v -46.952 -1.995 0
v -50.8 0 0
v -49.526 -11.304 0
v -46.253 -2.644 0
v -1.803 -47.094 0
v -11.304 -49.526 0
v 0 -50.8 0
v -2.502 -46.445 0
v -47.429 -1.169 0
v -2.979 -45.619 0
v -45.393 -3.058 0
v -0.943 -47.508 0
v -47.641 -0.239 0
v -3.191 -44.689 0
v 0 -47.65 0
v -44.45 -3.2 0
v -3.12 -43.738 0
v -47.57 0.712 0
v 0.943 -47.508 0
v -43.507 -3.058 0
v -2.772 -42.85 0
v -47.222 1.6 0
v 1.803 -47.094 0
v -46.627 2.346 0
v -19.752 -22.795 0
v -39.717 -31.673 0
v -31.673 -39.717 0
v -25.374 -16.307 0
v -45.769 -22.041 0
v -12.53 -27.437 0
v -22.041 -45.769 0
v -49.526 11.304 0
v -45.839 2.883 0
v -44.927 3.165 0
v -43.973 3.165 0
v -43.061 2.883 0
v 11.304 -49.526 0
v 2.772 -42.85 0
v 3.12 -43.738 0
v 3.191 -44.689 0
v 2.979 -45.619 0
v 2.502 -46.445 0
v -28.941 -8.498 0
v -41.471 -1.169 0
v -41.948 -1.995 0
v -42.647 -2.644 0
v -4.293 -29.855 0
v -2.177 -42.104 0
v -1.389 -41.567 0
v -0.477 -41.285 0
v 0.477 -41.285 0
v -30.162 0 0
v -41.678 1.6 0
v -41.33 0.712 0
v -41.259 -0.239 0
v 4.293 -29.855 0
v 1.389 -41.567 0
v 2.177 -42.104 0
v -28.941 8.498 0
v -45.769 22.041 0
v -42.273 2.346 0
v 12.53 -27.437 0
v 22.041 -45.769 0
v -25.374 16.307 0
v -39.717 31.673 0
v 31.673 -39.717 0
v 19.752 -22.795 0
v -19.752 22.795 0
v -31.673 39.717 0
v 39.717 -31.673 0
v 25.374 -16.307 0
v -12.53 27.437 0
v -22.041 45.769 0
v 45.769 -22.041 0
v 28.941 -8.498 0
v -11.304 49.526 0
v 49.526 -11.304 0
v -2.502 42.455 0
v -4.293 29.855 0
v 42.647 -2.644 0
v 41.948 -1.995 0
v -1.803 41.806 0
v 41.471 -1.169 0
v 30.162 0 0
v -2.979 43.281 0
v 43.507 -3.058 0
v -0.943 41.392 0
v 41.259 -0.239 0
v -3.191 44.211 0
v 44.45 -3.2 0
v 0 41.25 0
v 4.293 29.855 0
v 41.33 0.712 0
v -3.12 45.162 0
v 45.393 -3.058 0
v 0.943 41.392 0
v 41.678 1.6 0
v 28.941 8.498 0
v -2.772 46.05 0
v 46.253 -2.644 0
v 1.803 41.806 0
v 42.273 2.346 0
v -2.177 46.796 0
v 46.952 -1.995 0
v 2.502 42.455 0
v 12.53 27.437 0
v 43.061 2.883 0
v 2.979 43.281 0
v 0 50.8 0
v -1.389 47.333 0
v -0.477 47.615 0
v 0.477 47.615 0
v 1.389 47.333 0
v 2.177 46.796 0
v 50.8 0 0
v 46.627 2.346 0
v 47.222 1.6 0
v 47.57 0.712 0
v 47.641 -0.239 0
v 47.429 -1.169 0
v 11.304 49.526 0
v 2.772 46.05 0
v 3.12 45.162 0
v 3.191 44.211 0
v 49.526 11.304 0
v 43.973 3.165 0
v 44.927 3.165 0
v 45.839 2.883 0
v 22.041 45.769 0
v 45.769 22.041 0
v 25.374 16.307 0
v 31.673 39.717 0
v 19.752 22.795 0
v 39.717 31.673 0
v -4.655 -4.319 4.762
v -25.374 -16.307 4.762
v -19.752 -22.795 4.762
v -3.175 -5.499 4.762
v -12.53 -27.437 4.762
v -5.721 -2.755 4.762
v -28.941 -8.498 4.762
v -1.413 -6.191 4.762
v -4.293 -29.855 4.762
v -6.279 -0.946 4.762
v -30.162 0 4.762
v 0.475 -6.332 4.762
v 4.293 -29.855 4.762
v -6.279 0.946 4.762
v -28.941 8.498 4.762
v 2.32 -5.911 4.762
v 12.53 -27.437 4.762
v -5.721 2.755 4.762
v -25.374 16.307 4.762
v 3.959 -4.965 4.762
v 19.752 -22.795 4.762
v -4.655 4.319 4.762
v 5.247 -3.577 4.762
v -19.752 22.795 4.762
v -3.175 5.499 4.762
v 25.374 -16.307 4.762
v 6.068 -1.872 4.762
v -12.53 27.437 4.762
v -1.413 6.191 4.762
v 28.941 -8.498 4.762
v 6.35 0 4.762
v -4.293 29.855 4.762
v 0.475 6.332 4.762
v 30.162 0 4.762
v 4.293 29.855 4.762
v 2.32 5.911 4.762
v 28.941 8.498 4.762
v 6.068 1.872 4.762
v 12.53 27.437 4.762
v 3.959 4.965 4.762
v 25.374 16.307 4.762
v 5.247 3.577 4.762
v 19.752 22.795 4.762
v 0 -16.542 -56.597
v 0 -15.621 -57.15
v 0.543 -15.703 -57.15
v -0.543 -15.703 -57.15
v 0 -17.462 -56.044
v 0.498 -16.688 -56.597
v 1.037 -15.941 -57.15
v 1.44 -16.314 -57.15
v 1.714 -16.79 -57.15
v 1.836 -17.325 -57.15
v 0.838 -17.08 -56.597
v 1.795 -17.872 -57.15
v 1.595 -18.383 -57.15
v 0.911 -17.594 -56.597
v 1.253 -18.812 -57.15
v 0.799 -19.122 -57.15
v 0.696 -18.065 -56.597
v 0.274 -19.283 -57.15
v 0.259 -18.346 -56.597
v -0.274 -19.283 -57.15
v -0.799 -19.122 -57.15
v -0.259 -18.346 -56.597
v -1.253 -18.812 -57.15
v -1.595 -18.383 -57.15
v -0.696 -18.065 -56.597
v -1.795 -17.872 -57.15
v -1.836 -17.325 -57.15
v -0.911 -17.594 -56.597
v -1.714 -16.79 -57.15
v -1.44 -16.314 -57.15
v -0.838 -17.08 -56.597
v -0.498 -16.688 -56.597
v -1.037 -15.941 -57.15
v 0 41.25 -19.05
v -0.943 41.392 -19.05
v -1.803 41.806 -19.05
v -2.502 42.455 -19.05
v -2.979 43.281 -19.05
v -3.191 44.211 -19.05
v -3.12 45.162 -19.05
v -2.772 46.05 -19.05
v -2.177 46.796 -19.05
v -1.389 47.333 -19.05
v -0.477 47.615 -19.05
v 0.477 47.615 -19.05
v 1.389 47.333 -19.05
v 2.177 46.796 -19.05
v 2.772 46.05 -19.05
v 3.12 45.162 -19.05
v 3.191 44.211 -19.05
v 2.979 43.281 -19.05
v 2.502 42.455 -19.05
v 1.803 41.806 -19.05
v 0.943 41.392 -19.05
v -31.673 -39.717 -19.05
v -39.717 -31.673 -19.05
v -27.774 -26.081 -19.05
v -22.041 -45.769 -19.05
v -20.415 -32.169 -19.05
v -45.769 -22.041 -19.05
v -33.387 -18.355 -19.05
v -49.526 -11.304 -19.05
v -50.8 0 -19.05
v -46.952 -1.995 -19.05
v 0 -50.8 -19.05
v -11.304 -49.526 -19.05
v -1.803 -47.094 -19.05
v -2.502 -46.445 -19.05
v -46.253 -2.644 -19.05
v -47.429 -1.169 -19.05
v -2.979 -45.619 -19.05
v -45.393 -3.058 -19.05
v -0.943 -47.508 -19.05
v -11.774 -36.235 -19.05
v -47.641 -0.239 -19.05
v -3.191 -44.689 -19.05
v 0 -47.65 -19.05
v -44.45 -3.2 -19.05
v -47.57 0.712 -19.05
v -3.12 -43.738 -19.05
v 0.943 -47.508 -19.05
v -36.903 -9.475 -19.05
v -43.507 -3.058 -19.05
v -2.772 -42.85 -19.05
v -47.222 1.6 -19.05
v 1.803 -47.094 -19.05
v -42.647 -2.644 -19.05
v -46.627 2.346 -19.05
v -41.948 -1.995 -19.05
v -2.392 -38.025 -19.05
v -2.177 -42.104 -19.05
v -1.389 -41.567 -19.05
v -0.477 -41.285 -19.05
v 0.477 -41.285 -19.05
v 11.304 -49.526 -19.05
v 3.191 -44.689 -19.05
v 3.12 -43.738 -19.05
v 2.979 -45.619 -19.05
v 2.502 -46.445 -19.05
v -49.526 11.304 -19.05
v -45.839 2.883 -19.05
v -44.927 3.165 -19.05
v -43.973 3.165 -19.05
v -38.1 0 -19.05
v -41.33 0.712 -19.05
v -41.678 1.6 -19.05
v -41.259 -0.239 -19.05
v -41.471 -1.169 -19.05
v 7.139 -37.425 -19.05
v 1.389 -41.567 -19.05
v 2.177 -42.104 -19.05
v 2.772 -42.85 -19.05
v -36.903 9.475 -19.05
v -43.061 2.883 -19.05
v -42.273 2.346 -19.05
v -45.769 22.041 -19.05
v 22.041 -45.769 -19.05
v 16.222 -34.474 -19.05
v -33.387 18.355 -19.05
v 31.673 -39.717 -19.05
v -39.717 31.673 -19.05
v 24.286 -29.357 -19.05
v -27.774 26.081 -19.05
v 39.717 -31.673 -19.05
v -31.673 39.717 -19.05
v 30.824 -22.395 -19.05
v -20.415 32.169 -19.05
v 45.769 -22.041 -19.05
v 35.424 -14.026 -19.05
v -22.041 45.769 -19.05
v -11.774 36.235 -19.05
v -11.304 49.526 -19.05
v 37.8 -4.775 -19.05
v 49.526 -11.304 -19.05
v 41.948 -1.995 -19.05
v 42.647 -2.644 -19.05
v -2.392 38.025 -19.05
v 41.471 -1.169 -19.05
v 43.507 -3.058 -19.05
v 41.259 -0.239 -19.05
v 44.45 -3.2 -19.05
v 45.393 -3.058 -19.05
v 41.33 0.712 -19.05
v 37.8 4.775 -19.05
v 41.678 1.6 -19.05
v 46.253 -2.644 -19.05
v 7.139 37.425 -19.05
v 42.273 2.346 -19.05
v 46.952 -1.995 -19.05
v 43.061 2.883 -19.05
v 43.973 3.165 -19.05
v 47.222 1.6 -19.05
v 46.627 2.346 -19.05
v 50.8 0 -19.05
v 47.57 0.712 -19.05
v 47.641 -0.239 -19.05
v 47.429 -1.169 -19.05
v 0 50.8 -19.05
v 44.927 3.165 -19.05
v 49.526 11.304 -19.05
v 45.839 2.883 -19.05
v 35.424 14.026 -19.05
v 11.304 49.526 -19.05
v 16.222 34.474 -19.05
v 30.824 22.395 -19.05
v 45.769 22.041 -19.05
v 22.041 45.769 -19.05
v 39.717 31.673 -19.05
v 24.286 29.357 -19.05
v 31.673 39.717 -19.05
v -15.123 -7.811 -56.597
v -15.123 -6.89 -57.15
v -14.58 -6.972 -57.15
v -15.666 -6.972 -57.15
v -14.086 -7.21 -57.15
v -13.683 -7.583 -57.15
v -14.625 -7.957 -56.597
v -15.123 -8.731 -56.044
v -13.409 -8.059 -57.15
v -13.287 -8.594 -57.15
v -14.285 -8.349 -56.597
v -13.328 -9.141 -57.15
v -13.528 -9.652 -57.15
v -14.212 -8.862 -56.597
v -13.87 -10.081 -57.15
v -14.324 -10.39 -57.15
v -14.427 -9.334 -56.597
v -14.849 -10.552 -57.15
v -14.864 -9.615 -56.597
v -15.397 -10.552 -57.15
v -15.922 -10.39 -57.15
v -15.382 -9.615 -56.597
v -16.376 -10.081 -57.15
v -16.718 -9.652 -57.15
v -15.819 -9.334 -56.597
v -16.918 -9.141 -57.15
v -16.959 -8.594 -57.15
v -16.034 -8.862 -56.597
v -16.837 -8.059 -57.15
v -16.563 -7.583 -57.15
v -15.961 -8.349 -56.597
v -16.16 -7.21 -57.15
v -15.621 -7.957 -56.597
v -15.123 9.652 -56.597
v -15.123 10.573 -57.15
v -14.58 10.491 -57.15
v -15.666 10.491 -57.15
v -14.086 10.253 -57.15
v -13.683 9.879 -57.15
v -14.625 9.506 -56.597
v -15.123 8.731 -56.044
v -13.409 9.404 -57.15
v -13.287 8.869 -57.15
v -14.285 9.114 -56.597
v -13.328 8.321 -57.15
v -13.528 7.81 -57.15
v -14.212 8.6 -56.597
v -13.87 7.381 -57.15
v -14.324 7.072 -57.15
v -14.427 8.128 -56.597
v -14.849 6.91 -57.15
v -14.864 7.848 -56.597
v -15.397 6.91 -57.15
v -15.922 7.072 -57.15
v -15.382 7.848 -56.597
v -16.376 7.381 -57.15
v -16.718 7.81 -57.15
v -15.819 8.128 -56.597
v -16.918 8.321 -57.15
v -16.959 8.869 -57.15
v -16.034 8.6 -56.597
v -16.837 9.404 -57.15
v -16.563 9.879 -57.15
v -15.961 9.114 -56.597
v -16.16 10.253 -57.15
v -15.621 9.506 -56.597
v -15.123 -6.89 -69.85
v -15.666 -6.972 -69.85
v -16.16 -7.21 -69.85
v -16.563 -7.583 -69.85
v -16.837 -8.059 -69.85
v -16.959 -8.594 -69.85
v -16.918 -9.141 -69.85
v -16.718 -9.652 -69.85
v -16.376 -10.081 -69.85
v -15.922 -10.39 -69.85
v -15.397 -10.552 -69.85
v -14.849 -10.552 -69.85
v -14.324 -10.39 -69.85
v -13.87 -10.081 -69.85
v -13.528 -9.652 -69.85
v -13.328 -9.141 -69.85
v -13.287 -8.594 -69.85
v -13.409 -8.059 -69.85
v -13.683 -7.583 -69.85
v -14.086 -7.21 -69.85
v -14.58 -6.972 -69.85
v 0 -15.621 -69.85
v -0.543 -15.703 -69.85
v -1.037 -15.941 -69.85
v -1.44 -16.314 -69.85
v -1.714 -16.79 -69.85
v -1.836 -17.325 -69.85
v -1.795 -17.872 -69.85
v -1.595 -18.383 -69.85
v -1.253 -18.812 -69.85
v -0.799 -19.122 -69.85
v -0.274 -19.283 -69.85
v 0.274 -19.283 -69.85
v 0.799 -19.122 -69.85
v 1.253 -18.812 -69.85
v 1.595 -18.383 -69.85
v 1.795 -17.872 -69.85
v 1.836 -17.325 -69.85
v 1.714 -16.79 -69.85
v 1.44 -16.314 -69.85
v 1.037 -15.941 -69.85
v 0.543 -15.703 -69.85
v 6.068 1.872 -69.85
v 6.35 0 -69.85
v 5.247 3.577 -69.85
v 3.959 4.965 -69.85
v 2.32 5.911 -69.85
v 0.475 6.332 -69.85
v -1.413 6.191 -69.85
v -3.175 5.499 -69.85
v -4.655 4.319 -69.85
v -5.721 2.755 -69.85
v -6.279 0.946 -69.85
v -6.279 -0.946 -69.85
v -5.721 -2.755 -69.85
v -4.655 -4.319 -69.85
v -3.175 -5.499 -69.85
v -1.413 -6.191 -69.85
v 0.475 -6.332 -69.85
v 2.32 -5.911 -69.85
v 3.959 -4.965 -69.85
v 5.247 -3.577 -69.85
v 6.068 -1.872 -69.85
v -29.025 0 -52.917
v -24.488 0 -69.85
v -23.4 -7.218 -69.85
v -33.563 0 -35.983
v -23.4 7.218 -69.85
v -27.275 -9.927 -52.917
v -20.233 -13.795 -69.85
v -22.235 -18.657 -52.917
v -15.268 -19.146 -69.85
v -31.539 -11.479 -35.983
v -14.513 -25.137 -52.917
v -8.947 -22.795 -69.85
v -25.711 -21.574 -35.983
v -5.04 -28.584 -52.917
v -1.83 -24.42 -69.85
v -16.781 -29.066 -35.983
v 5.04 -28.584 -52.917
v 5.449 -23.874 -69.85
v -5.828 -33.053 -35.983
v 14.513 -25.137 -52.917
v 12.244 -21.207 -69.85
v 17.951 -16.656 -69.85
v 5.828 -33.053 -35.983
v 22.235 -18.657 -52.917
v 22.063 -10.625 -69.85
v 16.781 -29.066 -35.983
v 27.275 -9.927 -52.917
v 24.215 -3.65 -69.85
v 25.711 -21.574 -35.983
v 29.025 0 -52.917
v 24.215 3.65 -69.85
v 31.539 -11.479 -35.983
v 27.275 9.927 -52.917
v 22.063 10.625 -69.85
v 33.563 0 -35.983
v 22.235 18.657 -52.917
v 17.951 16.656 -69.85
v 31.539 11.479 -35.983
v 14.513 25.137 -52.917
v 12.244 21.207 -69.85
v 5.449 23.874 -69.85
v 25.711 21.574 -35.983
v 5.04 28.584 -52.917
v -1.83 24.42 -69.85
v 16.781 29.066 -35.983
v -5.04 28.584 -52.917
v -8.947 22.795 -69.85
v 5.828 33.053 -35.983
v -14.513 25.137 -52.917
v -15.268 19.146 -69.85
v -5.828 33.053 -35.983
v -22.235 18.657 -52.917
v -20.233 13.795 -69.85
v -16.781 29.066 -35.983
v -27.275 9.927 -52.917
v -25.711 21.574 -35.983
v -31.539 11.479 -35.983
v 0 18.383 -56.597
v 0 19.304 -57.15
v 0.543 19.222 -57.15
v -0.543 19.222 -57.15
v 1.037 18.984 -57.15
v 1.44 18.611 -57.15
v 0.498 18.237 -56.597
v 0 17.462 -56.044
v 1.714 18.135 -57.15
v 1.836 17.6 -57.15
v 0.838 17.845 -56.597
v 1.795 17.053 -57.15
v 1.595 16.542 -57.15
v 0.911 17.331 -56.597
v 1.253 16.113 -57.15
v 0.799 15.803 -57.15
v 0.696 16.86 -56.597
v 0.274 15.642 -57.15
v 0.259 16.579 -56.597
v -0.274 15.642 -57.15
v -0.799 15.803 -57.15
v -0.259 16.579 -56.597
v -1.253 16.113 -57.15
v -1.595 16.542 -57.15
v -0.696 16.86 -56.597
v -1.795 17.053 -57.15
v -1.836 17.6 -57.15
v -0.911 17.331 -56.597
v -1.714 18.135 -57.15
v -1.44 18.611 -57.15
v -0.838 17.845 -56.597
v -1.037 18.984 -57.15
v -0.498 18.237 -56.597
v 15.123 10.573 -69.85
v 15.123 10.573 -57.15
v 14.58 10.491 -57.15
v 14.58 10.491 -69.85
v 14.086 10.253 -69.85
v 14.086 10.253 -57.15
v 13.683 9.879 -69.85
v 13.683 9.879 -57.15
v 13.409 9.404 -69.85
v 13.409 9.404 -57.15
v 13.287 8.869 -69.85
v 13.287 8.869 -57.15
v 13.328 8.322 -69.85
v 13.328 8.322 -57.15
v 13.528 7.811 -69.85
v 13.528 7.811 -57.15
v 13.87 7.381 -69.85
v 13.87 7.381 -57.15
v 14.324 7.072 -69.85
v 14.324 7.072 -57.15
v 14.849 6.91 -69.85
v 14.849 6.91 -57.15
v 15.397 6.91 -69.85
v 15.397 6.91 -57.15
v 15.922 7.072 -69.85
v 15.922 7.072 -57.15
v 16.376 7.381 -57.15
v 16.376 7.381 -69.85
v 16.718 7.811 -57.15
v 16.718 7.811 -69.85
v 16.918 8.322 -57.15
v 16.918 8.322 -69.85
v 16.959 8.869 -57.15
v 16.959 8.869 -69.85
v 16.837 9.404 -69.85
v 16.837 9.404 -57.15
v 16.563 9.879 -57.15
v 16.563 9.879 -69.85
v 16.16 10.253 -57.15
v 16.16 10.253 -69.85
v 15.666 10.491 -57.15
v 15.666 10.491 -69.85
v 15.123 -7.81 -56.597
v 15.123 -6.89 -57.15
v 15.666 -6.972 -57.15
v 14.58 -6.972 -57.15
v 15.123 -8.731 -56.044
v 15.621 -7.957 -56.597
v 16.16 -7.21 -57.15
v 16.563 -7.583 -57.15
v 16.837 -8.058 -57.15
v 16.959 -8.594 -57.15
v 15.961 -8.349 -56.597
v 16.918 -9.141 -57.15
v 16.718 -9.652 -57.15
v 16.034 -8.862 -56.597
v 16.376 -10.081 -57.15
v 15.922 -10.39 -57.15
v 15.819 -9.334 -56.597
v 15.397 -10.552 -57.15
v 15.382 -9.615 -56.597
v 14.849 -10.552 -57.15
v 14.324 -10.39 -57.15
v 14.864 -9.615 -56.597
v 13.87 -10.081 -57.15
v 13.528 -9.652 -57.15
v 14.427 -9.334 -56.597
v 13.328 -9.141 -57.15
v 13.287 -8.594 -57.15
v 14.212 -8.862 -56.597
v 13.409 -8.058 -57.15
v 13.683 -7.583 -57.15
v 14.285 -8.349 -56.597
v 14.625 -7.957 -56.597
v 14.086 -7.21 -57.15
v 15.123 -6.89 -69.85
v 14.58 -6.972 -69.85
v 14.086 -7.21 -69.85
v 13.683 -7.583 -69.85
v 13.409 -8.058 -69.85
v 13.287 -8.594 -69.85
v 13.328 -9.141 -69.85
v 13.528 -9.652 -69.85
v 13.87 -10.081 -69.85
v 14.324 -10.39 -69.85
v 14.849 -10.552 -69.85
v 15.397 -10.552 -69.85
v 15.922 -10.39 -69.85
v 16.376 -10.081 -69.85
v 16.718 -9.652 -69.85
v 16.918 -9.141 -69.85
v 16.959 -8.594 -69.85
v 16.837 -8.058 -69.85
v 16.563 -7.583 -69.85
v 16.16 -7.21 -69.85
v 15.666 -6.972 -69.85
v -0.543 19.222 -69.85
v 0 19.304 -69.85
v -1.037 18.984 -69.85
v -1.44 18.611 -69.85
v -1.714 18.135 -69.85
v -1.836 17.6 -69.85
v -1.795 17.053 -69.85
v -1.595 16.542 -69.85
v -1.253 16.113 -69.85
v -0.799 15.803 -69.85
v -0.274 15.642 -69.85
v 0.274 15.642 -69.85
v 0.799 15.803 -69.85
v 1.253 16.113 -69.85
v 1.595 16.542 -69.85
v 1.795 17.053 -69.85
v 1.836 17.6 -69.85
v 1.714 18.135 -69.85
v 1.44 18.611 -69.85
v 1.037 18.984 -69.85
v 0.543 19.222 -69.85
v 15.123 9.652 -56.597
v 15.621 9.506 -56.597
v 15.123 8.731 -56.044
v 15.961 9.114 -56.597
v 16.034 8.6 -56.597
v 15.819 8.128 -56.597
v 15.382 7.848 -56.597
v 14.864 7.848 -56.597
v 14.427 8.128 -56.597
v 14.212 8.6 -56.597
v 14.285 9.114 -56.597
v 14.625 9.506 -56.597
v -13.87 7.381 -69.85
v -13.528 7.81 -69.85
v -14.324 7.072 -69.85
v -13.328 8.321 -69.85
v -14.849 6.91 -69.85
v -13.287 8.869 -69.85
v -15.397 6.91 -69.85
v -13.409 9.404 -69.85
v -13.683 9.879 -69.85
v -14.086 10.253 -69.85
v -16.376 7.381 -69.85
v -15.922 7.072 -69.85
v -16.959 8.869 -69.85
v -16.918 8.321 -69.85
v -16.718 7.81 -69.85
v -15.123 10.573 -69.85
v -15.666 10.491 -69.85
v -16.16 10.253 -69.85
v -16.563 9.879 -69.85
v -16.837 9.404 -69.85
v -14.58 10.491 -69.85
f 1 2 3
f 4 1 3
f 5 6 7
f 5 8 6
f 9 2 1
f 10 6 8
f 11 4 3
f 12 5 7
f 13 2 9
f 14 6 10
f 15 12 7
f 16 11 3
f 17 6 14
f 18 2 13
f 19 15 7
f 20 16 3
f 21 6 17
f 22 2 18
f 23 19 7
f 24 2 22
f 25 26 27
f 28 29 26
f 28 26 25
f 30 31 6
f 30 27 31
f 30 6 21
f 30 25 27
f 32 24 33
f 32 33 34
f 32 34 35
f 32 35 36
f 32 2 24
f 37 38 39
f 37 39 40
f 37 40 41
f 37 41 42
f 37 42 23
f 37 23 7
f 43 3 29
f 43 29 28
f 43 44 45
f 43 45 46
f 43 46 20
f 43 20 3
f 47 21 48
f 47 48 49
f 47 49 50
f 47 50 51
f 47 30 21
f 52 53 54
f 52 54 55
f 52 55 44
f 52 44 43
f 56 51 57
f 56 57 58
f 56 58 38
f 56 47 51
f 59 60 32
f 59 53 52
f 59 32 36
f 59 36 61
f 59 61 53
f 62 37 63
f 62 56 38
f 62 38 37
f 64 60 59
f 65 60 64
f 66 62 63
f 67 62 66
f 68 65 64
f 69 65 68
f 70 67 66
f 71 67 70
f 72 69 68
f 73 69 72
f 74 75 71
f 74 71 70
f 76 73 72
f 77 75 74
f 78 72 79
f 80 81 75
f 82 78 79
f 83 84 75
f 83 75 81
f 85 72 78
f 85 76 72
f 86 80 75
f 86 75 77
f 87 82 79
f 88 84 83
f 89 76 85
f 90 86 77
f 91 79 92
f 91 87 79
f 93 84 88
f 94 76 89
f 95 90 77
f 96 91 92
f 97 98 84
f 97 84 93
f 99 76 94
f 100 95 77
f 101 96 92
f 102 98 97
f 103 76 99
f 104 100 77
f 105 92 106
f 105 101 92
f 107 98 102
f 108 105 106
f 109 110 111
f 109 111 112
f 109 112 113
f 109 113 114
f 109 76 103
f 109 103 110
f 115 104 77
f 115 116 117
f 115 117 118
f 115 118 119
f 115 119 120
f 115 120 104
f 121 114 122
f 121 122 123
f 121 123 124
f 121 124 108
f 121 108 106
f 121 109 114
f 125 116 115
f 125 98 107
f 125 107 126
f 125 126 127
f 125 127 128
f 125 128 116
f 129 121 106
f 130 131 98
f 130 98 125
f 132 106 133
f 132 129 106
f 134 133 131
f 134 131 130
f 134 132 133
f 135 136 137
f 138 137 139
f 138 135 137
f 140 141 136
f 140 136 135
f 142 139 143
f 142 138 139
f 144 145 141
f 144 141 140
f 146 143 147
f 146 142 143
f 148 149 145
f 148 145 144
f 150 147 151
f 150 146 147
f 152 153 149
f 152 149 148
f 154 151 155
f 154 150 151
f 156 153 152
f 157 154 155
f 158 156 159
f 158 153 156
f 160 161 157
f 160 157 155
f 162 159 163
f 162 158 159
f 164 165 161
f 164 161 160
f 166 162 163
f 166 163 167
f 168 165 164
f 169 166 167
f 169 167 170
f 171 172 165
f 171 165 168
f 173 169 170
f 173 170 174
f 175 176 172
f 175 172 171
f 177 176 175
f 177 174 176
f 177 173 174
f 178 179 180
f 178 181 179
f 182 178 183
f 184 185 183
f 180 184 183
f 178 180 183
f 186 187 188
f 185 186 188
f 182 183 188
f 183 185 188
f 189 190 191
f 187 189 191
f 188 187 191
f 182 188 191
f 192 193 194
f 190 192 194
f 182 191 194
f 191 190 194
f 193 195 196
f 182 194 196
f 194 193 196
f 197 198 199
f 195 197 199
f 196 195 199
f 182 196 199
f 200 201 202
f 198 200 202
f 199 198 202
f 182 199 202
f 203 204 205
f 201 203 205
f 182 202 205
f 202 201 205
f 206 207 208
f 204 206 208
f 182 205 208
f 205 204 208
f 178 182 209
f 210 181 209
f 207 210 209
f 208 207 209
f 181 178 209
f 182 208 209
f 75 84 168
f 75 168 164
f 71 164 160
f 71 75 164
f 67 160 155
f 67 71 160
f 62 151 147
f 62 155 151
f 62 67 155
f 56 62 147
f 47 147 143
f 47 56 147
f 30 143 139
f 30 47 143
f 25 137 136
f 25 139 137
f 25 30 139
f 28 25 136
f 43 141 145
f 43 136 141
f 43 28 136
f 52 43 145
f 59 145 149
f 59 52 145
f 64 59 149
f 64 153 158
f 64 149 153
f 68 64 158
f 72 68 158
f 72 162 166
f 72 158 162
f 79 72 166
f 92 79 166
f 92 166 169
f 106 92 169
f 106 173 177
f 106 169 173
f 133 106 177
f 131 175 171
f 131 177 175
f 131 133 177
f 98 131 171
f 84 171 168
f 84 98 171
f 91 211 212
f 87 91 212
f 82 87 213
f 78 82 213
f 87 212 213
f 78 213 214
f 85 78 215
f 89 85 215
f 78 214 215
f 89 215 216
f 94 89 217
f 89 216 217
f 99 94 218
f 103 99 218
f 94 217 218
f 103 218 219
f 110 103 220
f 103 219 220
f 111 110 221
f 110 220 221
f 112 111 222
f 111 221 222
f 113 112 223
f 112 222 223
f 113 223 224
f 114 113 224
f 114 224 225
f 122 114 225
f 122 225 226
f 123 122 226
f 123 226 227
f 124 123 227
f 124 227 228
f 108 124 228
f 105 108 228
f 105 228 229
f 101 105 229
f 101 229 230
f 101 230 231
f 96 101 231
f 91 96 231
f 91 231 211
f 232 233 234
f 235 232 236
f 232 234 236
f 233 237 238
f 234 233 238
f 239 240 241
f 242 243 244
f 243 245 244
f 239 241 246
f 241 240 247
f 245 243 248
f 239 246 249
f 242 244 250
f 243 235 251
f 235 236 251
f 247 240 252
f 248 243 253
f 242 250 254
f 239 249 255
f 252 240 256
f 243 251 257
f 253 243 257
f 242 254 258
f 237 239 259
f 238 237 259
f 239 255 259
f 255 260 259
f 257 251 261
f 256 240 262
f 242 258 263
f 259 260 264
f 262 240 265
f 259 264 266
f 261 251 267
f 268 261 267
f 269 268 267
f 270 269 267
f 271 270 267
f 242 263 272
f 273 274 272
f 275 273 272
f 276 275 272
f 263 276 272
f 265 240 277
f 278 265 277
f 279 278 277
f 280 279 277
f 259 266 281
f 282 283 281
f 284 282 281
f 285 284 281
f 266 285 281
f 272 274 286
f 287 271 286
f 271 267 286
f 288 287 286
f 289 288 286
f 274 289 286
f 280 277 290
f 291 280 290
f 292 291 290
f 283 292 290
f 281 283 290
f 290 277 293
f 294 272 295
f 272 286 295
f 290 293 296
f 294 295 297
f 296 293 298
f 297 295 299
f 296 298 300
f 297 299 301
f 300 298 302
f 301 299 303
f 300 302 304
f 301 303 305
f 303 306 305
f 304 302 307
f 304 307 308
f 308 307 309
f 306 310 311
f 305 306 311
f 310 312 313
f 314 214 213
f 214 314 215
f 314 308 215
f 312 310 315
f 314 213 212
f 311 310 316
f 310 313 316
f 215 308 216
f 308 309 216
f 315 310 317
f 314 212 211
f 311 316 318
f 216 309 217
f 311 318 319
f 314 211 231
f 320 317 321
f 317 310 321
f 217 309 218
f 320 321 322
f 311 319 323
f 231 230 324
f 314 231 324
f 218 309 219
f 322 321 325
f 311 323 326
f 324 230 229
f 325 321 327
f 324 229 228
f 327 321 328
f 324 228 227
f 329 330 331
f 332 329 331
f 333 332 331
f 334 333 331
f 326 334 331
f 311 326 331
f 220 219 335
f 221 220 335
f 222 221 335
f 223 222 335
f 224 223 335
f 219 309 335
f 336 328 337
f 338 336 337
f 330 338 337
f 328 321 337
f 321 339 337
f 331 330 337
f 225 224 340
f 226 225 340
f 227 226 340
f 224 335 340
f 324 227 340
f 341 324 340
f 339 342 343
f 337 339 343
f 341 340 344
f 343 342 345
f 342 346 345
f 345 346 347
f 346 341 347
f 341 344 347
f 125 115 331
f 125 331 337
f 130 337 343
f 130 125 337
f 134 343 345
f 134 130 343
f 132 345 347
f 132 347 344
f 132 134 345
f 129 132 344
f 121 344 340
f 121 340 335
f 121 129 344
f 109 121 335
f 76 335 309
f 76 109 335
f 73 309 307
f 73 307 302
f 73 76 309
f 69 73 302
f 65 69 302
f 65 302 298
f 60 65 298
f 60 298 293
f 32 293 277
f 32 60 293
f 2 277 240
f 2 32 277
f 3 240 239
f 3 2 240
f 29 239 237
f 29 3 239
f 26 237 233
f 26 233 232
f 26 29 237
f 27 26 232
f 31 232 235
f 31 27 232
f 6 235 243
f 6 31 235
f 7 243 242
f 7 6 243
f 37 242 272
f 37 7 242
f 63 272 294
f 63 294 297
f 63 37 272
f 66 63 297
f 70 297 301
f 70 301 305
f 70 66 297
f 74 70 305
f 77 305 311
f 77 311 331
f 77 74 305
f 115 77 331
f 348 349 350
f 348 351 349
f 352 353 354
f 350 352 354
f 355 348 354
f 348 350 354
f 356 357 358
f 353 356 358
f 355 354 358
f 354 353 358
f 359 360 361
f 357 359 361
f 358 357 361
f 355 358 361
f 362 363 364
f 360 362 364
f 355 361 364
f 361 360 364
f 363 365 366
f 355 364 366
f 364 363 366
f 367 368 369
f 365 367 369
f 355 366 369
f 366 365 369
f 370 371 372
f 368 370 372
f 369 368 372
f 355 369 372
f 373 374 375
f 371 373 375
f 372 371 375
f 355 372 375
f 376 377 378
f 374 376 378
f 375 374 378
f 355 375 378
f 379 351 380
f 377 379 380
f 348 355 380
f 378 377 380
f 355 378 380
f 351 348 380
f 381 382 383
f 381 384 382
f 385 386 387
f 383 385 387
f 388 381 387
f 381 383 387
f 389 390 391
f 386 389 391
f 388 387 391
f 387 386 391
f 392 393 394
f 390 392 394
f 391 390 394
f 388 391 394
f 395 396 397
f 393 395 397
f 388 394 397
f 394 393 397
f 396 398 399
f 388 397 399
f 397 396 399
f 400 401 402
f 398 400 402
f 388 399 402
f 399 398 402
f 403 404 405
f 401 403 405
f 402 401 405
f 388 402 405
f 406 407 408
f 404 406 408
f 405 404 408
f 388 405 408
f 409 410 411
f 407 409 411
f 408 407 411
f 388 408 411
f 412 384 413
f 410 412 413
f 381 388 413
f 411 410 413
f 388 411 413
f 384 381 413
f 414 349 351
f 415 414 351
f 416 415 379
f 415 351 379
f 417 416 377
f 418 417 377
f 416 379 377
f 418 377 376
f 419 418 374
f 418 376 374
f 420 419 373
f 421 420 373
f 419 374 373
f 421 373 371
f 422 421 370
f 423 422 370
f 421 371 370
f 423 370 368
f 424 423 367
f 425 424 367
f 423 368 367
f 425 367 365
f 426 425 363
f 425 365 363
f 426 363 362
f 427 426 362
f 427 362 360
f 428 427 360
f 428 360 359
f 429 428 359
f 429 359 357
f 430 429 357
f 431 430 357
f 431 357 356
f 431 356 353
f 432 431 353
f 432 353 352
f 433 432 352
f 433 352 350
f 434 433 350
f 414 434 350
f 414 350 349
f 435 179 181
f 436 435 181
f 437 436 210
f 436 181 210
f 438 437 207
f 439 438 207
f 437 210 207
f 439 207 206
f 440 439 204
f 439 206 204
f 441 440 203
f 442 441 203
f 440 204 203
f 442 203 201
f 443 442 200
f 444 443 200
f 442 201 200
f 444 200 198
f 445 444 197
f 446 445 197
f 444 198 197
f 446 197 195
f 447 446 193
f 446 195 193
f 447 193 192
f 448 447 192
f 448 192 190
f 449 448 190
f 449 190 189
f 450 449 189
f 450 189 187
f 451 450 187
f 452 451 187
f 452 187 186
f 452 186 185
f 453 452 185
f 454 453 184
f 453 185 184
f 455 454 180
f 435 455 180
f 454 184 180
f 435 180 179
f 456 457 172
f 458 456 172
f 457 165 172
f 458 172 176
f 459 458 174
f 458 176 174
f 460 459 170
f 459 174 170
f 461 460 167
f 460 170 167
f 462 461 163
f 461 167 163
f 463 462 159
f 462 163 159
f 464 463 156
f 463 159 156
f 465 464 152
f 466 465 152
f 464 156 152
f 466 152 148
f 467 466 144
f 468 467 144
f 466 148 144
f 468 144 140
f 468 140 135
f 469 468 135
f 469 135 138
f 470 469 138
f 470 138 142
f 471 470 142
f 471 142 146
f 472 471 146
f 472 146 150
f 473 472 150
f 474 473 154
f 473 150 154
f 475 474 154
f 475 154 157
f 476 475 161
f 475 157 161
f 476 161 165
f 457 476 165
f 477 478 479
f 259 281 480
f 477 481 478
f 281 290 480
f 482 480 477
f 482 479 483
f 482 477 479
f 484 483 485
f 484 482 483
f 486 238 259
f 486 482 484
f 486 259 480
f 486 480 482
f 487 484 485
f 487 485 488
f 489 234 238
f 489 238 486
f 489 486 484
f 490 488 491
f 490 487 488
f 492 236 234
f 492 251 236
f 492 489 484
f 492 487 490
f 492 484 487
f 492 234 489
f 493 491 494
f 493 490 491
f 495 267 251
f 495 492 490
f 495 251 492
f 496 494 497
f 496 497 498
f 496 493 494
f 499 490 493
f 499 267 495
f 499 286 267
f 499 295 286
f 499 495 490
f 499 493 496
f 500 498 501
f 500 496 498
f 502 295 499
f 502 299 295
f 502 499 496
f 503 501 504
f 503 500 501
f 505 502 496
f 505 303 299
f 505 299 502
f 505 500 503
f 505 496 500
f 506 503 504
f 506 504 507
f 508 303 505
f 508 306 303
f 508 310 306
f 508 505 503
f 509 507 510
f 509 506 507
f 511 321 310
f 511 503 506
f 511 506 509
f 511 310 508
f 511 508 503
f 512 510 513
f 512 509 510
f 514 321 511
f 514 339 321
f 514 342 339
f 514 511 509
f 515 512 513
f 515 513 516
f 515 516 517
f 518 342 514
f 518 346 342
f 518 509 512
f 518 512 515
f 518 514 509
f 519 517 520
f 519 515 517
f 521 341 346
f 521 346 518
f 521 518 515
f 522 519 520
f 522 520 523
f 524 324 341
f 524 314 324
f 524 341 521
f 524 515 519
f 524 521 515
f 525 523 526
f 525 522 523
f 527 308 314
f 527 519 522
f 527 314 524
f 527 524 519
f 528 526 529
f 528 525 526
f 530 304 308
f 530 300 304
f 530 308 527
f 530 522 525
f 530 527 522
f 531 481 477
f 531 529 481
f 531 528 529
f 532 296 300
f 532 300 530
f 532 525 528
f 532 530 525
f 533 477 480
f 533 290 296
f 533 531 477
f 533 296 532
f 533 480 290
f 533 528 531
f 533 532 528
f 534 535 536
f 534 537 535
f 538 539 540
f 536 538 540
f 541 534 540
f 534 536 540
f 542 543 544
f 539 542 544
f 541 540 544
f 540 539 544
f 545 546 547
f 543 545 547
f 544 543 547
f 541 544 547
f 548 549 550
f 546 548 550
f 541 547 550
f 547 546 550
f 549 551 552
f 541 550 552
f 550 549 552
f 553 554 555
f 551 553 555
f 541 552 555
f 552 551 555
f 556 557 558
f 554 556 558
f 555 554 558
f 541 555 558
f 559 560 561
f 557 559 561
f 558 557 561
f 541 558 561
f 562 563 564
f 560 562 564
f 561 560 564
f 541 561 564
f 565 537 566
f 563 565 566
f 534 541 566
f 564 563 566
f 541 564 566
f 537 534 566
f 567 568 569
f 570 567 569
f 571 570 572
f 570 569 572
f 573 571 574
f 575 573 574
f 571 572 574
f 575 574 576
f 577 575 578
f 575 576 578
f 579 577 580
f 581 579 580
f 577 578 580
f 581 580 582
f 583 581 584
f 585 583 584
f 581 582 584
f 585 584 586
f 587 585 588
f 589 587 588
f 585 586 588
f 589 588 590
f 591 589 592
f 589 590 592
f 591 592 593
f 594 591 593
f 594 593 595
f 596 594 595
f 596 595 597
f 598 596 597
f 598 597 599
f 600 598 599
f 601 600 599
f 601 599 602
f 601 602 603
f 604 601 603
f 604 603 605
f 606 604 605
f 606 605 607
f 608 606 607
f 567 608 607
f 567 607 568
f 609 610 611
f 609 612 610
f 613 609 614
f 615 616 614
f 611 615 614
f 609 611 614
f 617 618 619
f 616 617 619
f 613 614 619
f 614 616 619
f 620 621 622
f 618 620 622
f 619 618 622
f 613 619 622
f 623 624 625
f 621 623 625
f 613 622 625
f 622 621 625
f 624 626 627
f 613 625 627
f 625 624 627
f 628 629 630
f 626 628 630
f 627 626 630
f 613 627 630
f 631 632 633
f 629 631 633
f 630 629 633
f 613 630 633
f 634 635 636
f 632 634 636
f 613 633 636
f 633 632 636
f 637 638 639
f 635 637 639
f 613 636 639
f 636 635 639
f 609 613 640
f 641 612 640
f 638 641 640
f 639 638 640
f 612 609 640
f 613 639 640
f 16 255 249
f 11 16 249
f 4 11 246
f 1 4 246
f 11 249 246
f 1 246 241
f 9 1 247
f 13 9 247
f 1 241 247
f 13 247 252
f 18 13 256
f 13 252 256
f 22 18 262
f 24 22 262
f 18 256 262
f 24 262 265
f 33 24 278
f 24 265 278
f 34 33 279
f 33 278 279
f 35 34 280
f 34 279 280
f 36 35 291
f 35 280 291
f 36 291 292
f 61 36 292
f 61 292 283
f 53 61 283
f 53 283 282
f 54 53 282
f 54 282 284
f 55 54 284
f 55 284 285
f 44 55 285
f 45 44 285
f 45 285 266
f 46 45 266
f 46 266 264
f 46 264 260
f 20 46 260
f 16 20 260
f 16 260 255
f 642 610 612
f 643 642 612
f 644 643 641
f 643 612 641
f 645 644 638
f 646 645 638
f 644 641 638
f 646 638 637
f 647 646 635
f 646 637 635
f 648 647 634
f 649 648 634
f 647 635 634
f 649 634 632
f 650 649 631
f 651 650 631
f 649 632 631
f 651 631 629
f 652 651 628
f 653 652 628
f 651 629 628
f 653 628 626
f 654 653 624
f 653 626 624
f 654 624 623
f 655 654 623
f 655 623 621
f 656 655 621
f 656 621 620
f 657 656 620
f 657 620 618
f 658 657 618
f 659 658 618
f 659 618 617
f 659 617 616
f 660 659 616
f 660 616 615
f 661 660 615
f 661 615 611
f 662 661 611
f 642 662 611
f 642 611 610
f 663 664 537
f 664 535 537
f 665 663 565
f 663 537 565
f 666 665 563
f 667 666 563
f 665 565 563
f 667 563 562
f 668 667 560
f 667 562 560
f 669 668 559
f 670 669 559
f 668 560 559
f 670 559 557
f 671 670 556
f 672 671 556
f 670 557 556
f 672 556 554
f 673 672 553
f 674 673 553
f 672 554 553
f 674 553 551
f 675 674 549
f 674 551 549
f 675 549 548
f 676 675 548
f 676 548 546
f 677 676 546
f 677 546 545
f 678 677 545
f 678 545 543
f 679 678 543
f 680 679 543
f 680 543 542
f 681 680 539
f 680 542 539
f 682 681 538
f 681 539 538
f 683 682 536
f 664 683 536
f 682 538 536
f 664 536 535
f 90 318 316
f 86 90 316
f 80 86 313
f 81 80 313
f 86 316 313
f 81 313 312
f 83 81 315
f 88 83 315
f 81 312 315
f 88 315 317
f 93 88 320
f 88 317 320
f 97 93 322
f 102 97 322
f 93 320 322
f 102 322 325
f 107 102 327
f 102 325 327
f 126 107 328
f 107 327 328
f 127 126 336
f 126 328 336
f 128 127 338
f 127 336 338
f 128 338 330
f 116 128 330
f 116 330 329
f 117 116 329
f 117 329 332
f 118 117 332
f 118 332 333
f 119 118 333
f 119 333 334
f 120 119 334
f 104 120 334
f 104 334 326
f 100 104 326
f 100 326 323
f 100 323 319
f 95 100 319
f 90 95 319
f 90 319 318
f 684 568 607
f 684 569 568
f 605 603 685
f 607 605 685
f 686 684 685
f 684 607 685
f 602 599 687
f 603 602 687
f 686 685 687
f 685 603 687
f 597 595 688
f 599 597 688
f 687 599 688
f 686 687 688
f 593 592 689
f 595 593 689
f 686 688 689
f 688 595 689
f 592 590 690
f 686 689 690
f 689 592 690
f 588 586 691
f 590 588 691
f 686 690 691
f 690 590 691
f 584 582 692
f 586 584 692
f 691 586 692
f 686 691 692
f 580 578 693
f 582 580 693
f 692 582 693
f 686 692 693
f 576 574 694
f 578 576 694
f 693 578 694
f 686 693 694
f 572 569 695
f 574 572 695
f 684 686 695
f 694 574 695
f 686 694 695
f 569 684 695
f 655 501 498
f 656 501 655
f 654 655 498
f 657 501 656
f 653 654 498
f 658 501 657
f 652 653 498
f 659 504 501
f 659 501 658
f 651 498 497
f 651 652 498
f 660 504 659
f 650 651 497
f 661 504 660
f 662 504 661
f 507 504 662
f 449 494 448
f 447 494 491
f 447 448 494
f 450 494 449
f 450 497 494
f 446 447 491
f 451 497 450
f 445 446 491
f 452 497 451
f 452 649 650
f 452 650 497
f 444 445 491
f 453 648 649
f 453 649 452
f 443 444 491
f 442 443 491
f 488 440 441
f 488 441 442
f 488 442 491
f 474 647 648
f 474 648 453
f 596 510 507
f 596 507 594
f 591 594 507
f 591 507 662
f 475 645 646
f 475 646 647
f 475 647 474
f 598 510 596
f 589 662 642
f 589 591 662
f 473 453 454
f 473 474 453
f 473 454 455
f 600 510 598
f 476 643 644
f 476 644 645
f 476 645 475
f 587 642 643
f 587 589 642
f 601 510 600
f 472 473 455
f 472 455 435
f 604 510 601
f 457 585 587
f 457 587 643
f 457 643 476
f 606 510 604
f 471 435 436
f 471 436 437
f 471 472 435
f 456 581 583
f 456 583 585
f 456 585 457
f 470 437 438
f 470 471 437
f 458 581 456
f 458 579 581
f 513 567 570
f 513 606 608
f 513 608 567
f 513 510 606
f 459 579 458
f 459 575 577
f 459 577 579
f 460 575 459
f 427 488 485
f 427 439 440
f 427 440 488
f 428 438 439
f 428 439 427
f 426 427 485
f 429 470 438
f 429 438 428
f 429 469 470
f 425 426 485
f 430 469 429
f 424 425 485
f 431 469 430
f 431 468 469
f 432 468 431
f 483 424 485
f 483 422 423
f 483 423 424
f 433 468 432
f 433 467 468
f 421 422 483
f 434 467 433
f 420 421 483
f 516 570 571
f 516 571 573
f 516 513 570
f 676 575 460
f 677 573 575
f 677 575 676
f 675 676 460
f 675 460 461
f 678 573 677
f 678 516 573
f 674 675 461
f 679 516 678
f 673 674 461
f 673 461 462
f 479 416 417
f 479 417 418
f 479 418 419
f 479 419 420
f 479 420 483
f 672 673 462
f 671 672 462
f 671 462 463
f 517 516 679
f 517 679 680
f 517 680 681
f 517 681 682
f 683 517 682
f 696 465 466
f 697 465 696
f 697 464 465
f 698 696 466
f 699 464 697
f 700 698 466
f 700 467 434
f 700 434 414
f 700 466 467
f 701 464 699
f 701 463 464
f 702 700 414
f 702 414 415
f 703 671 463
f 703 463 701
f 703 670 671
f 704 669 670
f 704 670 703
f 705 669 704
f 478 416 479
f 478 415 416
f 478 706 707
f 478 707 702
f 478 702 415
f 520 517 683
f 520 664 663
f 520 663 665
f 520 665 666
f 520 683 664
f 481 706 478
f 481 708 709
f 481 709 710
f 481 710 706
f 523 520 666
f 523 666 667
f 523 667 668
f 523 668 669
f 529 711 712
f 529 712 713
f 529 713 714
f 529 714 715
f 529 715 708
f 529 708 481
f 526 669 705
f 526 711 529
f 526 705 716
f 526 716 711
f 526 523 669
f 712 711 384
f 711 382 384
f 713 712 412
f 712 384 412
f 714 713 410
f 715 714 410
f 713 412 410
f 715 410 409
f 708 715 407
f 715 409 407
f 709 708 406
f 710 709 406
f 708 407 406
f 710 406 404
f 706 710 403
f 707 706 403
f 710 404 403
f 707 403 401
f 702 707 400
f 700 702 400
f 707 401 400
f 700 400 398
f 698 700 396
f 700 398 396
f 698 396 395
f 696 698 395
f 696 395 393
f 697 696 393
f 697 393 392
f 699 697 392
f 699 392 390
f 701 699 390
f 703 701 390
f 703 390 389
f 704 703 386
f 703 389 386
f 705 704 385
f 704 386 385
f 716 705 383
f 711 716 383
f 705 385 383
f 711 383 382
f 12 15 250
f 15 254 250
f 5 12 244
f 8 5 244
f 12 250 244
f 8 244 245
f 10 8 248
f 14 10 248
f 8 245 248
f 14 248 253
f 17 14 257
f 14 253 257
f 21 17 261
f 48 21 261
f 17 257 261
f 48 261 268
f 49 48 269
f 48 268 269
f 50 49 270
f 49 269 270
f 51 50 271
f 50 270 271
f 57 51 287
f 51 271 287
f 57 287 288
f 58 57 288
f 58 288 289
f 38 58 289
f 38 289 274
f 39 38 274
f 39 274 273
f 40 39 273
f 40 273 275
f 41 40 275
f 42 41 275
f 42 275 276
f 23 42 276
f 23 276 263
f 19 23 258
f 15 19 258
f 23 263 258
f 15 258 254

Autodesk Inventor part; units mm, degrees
ref_plane "YZ Plane" through (0, 0, 0) normal (1, 0, 0) x (0, 1, 0)
ref_plane "XZ Plane" through (0, 0, 0) normal (0, 1, 0) x (-1, 0, 0)
ref_plane "XY Plane" through (0, 0, 0) normal (0, 0, 1) x (1, 0, 0)
sketch "Sketch1" plane through (0, 0, 0) normal (0, 0, 1) x (1, 0, 0)
  line L0 (-71.12, 0) -> (71.12, 0) projected
  line L1 (0, -71.12) -> (0, 71.12) projected
  circle A0 centre (0, 0) radius 50.8
  dimension "d0" = 101.6
extrude "Extrusion1" add sketch "Sketch1" against normal blind 19.05
sketch "Sketch2" plane through (0, 0, 0) normal (0, 0, 1) x (1, 0, 0)
  circle A0 centre (0, 0) radius 50.8 projected
  circle A1 centre (0, 0) radius 30.1625
  dimension "d3" = 60.325
extrude "Extrusion2" add sketch "Sketch2" along normal blind 4.7625 contours A1
sketch "Sketch3" plane through (0, 0, 0) normal (0, 0, 1) x (1, 0, 0)
  circle A0 centre (0, 0) radius 30.1625 projected
  point P0 (0, 44.45)
  point P1 (-44.45, 0)
  point P2 (0, -44.45)
  point P3 (44.45, 0)
  dimension "d8" = 360
  dimension "d35" = 88.9
hole "Hole1" at (0, 44.45, 0) at (-44.45, 0, 0) at (0, -44.45, 0) at (44.45, 0, 0) direction (0, 0, -1) diameter 6.4008 end through all thread size "5/16-18 UNC" class "2B" standard "ANSI Unified Screw Threads"
sketch "Sketch5" plane through (0, 0, -19.05) normal (0, 0, -1) x (-1, 0, 0)
  circle A0 centre (0, 0) radius 50.8 projected
  circle A1 centre (0, 0) radius 38.1
  dimension "d17" = 76.2
extrude "Extrusion3" add sketch "Sketch5" along normal blind 50.8 draft -15 contours A1
sketch "Sketch6" plane through (0, 0, -69.85) normal (0, 0, -1) x (-1, 0, 0)
  circle A0 centre (0, 0) radius 24.4882 projected
  point P0 (0, 17.4625)
  point P1 (-15.123, 8.7313)
  point P2 (-15.123, -8.7312)
  point P3 (0, -17.4625)
  point P4 (15.123, -8.7313)
  point P5 (15.123, 8.7312)
  dimension "d22" = 360
  dimension "d24" = 17.4625
hole "Hole2" at (0, 17.4625, -69.85) at (15.123, 8.7313, -69.85) at (15.123, -8.7312, -69.85) at (0, -17.4625, -69.85) at (-15.123, -8.7313, -69.85) at (-15.123, 8.7312, -69.85) direction (0, 0, 1) diameter 3.683 depth 12.7 tip angle 118 thread size "10-24 UNC" class "2B" standard "ANSI Unified Screw Threads"
sketch "Sketch7" plane through (0, 0, 4.7625) normal (0, 0, 1) x (1, 0, 0)
  circle A0 centre (0, 0) radius 30.1625 projected
  circle A1 centre (0, 0) radius 6.35
  dimension "d32" = 12.7
extrude "Extrusion4" cut sketch "Sketch7" against normal through all contours A1
properties part number "wheel_hub"
